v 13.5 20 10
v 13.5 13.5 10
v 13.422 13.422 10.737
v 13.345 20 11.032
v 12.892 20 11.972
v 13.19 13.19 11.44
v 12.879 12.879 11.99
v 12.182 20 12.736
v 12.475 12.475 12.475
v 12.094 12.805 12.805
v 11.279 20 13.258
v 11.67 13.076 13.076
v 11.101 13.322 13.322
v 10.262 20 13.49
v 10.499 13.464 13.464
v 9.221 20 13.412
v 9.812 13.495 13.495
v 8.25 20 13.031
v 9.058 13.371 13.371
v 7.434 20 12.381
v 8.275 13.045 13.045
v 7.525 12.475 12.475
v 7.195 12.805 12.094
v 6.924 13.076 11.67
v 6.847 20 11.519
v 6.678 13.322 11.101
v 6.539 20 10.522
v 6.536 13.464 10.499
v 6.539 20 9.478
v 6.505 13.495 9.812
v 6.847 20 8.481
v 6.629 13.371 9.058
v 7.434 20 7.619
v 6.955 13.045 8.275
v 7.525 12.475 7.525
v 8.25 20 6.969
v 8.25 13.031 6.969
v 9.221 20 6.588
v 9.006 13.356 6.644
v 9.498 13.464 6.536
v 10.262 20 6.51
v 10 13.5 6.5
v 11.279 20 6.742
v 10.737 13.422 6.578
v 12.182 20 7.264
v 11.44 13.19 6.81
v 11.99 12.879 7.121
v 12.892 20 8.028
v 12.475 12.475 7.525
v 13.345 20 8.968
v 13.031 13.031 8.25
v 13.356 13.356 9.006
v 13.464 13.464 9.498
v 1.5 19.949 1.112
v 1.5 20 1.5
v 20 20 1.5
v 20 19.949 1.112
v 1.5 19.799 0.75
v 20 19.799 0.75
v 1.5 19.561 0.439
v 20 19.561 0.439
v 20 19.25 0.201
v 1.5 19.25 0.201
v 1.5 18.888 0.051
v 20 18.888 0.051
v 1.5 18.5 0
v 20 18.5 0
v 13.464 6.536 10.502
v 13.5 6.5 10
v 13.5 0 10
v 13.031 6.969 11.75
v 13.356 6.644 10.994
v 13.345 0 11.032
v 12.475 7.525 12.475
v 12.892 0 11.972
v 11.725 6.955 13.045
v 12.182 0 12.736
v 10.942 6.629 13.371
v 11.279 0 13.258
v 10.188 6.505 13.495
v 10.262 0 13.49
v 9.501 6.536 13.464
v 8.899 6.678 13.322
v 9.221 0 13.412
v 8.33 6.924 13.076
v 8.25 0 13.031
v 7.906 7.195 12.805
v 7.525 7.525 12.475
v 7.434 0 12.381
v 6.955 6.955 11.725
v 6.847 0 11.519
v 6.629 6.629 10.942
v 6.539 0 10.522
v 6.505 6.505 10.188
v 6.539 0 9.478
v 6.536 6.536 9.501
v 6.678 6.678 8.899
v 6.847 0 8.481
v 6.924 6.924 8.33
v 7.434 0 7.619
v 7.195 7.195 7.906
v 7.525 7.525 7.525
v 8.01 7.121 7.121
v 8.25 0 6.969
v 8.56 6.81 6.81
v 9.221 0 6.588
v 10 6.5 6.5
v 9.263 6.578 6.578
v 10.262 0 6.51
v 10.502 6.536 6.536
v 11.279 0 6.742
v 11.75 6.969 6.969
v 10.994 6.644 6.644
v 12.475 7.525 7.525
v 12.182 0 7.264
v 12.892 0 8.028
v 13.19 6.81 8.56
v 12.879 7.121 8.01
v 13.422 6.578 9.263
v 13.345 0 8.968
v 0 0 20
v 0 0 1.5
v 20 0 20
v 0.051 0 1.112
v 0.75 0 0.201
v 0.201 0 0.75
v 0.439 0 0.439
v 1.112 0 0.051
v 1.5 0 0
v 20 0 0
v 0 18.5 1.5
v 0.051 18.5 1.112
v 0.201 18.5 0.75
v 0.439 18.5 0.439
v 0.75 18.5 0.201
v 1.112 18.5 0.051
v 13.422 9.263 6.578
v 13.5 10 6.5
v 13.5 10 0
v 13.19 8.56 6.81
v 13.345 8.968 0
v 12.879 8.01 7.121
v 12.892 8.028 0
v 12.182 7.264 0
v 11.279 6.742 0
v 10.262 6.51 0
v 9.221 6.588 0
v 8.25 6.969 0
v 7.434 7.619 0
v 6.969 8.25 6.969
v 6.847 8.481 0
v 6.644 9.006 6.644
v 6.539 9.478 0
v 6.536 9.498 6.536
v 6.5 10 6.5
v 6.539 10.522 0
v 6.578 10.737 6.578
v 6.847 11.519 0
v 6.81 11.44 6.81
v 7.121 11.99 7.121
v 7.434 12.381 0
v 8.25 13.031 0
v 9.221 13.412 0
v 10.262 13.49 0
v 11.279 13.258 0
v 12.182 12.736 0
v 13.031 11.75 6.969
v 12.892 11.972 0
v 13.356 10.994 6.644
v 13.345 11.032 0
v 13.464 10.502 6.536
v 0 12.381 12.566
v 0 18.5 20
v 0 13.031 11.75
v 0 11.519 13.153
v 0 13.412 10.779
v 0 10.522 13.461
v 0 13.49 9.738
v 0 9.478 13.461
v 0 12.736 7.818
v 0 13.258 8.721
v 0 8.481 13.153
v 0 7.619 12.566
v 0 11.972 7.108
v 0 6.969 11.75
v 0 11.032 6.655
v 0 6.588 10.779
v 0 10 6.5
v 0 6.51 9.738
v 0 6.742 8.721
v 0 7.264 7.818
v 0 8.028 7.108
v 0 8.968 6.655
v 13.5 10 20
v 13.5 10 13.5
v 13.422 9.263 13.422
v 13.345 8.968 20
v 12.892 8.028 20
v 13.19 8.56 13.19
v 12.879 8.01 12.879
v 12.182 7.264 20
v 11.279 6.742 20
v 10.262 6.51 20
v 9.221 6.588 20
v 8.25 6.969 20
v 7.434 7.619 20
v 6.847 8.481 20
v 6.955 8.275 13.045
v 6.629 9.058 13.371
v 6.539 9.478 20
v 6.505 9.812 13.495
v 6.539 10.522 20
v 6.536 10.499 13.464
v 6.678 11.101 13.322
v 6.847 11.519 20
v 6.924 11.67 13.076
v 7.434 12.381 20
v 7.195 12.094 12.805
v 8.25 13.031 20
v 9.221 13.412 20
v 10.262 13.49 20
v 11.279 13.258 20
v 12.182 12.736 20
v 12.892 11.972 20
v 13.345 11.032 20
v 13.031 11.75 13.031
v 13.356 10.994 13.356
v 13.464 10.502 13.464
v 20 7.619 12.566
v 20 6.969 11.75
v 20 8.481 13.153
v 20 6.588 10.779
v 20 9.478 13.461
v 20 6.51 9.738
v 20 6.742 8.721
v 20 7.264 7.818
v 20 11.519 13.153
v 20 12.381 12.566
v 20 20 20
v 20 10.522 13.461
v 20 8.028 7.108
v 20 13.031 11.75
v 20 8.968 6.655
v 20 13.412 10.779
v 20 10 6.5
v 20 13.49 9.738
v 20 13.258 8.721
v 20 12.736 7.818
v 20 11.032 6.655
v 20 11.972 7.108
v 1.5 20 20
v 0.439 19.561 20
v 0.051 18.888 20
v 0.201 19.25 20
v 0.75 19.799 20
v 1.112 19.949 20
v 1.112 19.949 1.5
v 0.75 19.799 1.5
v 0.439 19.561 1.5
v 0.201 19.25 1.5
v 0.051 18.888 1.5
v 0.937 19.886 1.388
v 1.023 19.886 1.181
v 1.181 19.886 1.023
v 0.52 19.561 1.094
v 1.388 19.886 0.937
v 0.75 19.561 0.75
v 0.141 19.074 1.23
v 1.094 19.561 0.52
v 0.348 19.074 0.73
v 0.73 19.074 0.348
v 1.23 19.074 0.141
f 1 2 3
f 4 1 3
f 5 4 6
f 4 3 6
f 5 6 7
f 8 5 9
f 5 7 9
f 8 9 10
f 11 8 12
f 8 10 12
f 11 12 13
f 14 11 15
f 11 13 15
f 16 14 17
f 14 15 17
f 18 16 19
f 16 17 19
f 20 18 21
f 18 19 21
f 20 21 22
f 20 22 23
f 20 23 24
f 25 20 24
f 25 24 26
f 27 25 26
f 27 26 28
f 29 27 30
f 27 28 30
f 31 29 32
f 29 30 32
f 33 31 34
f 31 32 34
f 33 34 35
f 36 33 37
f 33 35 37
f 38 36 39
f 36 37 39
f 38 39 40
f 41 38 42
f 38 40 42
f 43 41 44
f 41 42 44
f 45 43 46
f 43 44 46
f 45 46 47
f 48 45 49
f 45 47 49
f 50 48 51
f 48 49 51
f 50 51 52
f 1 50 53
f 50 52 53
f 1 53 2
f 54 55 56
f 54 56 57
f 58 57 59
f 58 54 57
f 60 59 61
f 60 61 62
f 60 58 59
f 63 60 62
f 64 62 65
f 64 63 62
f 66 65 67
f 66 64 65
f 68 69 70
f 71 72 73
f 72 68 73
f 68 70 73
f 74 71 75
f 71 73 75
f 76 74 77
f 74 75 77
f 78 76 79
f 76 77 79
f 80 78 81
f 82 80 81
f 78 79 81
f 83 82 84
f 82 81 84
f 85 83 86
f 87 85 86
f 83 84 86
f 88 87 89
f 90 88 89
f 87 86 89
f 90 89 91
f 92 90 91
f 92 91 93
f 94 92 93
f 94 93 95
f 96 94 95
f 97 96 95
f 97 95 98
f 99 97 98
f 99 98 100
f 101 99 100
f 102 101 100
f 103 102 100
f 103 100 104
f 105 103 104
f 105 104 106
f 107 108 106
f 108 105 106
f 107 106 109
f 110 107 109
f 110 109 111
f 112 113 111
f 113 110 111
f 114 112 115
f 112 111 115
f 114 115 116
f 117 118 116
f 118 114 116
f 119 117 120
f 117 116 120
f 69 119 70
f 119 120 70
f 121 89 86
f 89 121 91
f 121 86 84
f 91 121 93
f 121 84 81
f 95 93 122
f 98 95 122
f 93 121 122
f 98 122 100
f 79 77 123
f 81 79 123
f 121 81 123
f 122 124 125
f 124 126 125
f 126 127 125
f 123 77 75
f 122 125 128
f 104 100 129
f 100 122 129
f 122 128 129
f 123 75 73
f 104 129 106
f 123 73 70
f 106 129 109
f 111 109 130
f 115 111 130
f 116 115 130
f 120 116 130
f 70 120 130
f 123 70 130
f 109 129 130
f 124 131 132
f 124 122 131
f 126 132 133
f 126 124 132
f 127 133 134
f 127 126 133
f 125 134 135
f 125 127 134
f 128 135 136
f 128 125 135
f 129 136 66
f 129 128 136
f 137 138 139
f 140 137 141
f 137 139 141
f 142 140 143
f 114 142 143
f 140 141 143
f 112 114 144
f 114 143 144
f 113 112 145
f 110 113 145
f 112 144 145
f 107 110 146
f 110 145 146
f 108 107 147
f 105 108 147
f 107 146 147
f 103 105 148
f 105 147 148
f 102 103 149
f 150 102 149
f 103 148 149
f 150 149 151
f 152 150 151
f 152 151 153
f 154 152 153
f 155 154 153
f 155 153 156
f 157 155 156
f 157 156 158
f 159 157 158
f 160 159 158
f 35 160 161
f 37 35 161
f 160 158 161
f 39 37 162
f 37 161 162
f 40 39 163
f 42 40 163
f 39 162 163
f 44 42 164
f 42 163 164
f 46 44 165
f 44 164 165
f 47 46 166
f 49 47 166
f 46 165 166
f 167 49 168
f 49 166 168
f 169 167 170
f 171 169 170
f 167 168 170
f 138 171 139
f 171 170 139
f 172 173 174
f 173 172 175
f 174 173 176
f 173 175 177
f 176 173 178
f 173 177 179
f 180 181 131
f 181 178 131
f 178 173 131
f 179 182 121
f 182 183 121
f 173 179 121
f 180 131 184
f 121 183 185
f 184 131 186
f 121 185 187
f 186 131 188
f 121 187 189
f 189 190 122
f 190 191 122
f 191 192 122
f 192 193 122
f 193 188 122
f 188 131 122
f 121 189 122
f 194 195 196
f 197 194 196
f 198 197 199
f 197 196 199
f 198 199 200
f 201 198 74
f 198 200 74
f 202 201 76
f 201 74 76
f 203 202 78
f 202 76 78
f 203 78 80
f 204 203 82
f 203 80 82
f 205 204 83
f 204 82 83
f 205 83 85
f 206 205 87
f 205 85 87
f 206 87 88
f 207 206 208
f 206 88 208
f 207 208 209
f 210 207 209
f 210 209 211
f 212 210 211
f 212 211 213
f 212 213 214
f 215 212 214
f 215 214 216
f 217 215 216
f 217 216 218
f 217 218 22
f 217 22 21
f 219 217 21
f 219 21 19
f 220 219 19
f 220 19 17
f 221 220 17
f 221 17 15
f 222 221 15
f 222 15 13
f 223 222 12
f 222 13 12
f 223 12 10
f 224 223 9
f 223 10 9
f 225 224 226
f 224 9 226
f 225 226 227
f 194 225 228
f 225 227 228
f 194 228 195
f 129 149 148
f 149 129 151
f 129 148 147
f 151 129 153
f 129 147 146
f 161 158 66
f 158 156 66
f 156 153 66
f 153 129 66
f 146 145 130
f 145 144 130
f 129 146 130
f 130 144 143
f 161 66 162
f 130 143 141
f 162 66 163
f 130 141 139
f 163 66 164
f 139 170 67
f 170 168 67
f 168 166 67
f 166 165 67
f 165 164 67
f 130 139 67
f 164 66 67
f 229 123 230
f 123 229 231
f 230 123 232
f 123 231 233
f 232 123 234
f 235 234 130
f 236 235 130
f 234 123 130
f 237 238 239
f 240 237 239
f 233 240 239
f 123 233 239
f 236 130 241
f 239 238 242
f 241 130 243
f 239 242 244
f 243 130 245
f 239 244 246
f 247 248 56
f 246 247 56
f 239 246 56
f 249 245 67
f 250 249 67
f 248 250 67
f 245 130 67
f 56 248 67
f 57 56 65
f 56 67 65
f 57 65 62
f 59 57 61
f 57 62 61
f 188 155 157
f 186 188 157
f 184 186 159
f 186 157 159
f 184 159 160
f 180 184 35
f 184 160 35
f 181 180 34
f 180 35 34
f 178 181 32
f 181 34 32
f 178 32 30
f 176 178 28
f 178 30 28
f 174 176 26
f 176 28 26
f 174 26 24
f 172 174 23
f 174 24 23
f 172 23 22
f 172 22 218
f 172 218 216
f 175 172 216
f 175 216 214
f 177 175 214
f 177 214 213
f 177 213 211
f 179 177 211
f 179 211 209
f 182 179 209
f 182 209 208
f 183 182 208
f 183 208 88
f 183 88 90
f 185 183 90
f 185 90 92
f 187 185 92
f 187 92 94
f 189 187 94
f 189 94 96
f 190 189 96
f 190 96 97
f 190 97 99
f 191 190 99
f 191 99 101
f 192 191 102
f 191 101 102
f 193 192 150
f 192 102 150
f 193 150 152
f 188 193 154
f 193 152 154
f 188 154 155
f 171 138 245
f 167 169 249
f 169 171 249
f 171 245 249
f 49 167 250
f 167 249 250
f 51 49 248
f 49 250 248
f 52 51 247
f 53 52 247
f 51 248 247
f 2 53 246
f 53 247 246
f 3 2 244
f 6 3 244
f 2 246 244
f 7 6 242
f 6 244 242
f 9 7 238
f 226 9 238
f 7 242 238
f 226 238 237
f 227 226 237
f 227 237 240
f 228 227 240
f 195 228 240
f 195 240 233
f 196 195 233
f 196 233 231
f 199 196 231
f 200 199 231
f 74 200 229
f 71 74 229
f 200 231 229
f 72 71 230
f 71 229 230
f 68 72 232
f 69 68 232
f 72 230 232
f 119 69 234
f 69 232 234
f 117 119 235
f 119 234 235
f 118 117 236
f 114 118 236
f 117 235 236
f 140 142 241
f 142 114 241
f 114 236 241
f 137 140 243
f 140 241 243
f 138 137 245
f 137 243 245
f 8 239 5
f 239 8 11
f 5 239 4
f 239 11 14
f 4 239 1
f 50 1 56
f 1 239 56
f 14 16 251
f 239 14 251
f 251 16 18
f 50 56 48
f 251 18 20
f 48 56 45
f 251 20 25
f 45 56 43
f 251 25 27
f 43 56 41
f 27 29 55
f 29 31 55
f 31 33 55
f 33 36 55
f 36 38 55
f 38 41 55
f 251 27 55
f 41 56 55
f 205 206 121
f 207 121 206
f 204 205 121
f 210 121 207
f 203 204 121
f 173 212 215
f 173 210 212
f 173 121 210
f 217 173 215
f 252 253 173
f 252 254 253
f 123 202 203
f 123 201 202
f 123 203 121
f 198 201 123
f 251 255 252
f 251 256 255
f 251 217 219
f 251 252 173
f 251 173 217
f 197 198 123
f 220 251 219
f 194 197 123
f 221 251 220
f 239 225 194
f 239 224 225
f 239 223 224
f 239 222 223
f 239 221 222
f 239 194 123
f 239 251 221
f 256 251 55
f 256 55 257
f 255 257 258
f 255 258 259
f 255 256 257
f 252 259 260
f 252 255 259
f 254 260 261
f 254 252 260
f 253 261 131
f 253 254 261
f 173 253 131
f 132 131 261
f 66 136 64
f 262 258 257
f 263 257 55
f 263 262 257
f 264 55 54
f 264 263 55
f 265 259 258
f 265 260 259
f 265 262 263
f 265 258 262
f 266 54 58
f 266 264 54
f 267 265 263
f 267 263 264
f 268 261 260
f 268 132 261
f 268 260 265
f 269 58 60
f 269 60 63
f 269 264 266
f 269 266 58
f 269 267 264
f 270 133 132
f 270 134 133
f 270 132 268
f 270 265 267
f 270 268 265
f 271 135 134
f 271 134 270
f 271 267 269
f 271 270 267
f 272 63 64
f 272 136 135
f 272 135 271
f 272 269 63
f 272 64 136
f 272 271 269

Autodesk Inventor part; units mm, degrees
ref_plane "YZ Plane" through (0, 0, 0) normal (1, 0, 0) x (0, 1, 0)
ref_plane "XZ Plane" through (0, 0, 0) normal (0, 1, 0) x (-1, 0, 0)
ref_plane "XY Plane" through (0, 0, 0) normal (0, 0, 1) x (1, 0, 0)
sketch "Sketch1" plane through (0, 0, 0) normal (0, 0, 1) x (1, 0, 0)
  line L0 (0, 0) -> (20, 0)
  line L1 (20, 0) -> (20, 20)
  line L2 (20, 20) -> (0, 20)
  line L3 (0, 20) -> (0, 0)
  circle A0 centre (10, 10) radius 3.5
  dimension "d0" = 20
  dimension "d1" = 20
  dimension "d2" = 7
extrude "Extrusion1" add sketch "Sketch1" along normal blind 20
sketch "Sketch2" plane through (20, 0, 0) normal (1, 0, 0) x (0, 0, -1)
  circle A0 centre (-10, 10) radius 3.5
  dimension "d5" = 7
extrude "Extrusion2" cut sketch "Sketch2" against normal blind 20
sketch "Sketch3" plane through (0, 0, 0) normal (0, -1, 0) x (1, 0, 0)
  circle A0 centre (10, 10) radius 3.5
  dimension "d8" = 7
extrude "Extrusion3" cut sketch "Sketch3" against normal blind 20
fillet "Fillet1" radius 1.5 3 edges at (0, 10, 0) (0, 20, 10) (10, 20, 0)
properties part number "Corner Profile"
